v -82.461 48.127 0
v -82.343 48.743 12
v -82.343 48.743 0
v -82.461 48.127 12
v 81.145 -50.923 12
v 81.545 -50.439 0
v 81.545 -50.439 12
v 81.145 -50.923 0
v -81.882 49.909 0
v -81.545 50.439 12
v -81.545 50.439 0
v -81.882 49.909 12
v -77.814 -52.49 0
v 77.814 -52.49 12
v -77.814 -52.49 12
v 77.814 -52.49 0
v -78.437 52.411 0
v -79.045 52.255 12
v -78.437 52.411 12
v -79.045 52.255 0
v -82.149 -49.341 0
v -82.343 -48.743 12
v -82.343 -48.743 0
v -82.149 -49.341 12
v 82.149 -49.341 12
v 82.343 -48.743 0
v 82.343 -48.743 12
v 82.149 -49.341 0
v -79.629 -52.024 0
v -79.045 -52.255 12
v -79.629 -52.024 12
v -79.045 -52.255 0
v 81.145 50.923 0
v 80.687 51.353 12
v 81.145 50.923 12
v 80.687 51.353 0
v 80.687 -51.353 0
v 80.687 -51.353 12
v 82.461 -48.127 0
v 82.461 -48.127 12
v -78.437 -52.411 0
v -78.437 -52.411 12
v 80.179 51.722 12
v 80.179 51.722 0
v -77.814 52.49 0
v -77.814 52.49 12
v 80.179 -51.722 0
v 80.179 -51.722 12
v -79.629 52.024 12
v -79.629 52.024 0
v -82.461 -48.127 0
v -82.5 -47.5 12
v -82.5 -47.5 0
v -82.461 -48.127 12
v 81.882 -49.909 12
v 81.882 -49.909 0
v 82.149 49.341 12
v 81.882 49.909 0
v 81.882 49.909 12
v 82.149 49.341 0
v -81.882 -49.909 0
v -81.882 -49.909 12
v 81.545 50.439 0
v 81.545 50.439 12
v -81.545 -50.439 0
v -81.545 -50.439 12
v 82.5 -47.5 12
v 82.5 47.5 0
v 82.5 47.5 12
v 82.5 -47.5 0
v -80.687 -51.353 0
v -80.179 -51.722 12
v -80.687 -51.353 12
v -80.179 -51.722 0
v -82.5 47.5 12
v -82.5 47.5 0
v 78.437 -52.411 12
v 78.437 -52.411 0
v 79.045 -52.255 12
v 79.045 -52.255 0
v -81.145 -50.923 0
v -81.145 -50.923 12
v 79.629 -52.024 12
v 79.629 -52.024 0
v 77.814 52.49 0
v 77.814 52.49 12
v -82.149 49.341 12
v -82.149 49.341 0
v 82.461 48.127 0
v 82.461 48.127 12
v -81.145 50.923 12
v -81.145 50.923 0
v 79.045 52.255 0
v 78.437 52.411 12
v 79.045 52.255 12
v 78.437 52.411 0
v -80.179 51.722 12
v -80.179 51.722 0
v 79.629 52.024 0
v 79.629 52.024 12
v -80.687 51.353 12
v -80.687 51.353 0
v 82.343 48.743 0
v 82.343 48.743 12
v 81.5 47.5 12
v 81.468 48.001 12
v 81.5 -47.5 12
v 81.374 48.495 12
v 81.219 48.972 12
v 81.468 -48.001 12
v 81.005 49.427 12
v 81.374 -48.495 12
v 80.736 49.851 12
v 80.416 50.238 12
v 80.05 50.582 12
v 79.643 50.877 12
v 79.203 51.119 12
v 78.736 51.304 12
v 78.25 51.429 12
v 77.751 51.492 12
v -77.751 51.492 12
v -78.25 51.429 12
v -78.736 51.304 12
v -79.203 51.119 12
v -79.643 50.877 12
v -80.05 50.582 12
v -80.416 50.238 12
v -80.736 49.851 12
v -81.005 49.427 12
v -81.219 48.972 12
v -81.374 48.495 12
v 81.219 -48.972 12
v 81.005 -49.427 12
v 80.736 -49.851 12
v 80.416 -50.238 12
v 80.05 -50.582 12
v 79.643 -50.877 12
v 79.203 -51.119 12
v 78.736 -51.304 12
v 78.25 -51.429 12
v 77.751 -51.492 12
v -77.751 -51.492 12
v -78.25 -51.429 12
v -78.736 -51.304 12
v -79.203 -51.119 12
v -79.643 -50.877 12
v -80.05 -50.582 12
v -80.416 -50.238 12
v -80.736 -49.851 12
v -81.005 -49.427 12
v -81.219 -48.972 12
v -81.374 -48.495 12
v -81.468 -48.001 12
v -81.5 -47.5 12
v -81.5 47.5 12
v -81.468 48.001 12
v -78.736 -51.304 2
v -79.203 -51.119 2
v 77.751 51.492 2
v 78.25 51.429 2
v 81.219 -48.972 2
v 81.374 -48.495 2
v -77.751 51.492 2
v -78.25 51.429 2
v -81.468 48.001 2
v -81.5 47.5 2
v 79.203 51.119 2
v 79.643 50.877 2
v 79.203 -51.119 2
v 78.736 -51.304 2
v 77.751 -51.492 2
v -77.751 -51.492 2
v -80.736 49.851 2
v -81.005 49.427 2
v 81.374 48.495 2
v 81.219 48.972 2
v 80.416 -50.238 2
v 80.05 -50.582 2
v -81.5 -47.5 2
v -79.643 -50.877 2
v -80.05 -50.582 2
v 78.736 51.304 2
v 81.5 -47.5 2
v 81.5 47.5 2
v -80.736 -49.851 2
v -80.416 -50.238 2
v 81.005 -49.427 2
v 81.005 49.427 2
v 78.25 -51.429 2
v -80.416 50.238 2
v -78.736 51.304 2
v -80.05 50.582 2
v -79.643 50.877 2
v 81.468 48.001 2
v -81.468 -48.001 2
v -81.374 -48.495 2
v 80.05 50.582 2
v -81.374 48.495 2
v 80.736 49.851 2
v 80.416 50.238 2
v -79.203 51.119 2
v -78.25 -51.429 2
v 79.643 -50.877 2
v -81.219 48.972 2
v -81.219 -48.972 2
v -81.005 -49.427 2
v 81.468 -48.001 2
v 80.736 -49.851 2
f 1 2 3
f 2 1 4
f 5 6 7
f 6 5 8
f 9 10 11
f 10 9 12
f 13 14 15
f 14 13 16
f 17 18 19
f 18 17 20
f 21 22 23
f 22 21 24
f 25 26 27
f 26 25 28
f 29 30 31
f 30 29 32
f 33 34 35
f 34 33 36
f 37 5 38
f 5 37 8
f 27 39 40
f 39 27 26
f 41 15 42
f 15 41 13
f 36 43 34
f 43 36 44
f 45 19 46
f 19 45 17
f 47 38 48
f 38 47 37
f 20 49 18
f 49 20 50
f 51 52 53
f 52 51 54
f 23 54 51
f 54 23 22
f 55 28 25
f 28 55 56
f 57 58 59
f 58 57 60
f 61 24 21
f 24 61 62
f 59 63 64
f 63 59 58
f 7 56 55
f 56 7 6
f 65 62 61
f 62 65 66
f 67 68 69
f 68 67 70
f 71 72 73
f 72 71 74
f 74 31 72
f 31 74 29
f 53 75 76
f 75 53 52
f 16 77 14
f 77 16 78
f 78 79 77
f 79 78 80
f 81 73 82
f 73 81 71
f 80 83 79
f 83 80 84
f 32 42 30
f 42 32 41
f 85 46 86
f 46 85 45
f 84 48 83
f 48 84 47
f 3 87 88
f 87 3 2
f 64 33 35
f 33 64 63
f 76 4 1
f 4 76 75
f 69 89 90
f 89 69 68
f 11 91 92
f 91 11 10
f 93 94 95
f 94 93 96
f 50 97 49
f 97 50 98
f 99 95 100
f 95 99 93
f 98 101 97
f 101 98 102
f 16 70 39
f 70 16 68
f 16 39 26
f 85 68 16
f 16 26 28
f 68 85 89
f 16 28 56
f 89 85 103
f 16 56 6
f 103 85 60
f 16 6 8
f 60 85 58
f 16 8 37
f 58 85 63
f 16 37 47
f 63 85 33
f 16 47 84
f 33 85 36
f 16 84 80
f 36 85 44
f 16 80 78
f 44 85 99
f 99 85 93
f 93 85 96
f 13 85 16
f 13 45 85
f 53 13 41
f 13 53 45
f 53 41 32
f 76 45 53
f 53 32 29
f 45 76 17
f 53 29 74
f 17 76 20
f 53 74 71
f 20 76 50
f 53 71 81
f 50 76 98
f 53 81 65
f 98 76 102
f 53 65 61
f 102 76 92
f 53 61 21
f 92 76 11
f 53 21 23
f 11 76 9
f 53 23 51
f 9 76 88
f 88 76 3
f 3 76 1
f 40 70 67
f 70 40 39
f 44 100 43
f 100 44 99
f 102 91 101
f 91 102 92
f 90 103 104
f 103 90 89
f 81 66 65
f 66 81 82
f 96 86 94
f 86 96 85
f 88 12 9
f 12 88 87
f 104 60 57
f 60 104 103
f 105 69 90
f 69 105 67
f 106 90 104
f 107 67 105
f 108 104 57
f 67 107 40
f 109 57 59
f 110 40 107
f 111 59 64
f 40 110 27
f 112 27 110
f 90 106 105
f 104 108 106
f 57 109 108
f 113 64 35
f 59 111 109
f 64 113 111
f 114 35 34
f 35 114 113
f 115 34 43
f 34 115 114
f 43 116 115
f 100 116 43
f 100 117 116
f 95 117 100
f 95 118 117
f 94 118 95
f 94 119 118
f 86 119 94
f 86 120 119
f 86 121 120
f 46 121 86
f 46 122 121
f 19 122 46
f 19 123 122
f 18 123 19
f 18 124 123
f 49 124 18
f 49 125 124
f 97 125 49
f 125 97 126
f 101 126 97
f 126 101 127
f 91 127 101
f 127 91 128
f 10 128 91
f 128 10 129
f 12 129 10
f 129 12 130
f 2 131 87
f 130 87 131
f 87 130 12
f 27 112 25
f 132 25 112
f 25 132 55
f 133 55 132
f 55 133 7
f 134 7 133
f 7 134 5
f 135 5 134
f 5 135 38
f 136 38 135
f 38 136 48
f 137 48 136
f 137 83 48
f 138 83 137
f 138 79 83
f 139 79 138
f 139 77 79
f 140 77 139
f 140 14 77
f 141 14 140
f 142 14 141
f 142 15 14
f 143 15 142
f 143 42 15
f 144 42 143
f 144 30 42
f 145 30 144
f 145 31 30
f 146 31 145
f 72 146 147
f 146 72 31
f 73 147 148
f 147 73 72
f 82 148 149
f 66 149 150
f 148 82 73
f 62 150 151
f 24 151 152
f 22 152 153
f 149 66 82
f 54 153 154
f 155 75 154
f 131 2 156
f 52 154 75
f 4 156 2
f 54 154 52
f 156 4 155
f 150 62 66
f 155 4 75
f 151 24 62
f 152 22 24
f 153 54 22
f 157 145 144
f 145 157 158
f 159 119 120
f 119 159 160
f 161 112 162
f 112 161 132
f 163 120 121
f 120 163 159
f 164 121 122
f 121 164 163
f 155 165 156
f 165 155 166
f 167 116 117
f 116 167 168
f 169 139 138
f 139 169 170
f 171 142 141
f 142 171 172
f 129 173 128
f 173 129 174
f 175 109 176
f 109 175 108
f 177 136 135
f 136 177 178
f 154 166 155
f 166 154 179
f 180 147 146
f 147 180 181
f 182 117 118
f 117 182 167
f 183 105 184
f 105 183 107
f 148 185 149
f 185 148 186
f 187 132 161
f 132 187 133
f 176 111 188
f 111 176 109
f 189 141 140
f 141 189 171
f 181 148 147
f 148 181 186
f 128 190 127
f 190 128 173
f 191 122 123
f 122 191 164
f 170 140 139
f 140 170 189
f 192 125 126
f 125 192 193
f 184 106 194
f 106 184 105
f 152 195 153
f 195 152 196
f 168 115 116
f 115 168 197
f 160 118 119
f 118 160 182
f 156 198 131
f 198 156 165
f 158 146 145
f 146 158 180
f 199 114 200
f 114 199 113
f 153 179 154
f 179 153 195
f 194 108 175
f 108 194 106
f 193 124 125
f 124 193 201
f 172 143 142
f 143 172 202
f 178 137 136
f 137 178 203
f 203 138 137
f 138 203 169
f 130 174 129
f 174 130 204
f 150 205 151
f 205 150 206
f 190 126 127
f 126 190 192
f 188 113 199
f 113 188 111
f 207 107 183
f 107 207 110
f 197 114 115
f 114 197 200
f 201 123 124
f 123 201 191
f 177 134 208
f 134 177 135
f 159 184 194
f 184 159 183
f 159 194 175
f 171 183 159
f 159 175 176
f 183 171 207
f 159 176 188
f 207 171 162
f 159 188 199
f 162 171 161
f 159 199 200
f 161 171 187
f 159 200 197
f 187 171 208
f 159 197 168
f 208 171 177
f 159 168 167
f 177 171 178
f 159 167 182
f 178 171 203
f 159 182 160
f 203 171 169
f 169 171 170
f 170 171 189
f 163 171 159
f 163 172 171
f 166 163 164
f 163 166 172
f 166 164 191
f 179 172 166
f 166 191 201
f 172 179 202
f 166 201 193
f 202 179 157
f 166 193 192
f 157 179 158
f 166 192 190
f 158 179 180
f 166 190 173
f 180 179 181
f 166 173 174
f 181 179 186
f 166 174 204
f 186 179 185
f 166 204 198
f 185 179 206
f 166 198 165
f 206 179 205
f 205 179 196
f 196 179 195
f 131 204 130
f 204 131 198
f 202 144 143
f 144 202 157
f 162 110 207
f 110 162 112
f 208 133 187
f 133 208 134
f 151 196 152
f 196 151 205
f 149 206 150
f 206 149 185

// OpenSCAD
$fn = 50;


difference() {
	union() {
		hull() {
			translate(v = [-77.5000000000, 47.5000000000, 0]) {
				cylinder(h = 12, r = 5);
			}
			translate(v = [77.5000000000, 47.5000000000, 0]) {
				cylinder(h = 12, r = 5);
			}
			translate(v = [-77.5000000000, -47.5000000000, 0]) {
				cylinder(h = 12, r = 5);
			}
			translate(v = [77.5000000000, -47.5000000000, 0]) {
				cylinder(h = 12, r = 5);
			}
		}
	}
	union() {
		translate(v = [0, 0, 2]) {
			hull() {
				translate(v = [-77.5000000000, 47.5000000000, 0]) {
					cylinder(h = 10, r = 4);
				}
				translate(v = [77.5000000000, 47.5000000000, 0]) {
					cylinder(h = 10, r = 4);
				}
				translate(v = [-77.5000000000, -47.5000000000, 0]) {
					cylinder(h = 10, r = 4);
				}
				translate(v = [77.5000000000, -47.5000000000, 0]) {
					cylinder(h = 10, r = 4);
				}
			}
		}
	}
}
